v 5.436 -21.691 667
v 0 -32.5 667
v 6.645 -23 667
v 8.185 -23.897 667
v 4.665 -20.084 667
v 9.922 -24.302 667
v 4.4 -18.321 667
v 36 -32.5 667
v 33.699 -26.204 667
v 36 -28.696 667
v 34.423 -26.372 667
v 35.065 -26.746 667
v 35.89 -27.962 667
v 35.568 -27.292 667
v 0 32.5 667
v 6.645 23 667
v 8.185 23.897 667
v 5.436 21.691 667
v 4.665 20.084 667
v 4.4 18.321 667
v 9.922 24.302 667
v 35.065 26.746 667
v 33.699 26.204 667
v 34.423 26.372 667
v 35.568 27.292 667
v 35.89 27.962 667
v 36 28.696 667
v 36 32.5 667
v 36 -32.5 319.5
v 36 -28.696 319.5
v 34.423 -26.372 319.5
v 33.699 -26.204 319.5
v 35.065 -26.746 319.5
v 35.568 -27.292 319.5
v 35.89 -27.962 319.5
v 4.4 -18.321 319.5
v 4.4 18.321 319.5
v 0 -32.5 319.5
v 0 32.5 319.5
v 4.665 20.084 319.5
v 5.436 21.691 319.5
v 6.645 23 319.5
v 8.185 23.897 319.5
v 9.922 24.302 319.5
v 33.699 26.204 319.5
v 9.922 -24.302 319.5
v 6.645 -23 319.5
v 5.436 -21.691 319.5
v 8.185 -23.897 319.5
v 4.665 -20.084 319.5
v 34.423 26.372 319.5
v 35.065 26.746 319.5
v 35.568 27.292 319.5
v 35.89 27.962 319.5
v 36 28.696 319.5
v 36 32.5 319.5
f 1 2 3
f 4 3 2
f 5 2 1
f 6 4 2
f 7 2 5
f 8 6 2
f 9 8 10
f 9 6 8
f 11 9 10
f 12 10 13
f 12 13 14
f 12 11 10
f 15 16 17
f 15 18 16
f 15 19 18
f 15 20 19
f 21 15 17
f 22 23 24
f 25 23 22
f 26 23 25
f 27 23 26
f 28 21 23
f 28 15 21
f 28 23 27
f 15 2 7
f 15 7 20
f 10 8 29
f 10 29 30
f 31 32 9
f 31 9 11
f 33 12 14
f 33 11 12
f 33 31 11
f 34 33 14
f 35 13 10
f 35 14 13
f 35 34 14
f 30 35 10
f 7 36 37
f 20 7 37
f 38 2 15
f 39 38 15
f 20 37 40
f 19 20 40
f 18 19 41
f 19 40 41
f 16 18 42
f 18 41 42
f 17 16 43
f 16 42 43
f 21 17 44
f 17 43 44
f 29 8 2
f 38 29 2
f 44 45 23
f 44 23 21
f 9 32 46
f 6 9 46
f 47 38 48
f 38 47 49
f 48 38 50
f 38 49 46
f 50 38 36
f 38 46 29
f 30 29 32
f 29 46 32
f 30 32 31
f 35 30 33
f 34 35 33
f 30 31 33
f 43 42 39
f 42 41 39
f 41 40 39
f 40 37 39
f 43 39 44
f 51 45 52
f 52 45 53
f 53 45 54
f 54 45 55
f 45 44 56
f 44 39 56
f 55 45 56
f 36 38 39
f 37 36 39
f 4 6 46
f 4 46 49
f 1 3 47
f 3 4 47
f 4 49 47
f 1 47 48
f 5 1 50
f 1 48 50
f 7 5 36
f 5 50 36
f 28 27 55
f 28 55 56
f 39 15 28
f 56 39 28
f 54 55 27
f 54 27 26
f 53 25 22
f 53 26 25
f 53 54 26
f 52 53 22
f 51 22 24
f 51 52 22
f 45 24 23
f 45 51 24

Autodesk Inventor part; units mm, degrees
ref_plane "Начальная плоскость" through (0, 0, 319.5) normal (0, 0, 1) x (1, 0, 0)
ref_plane "Конечная плоскость" through (0, 0, 667) normal (0, 0, 1) x (1, 0, 0)
sketch "Эскиз" plane through (0, 0, 0) normal (0, 0, 1) x (1, 0, 0)
  line L0 (36, -32.5) -> (0, -32.5)
  line L1 (36, -32.5) -> (36, -28.696)
  line L2 (33.6994, -26.2039) -> (9.9215, -24.3017)
  line L3 (4.4, -18.3208) -> (4.4, 18.3208)
  line L4 (33.6994, 26.2039) -> (9.9215, 24.3017)
  line L5 (36, 28.696) -> (36, 32.5)
  line L6 (0, 32.5) -> (36, 32.5)
  line L7 (0, -32.5) -> (0, 32.5)
  arc A0 (4.4, -18.3208) -> (9.9215, -24.3017) centre (10.4, -18.3208) ccw
  arc A1 (9.9215, 24.3017) -> (4.4, 18.3208) centre (10.4, 18.3208) ccw
  arc A2 (36, -28.696) -> (33.6994, -26.2039) centre (33.5, -28.696) ccw
  arc A3 (33.6994, 26.2039) -> (36, 28.696) centre (33.5, 28.696) ccw
  line L8 (0, 45.5) -> (0, -45.5) construction
  line L9 (-7.2974, 0) -> (43.7847, 0) construction
  point P0 (36, -26.388)
  point P1 (4.4, -23.86)
  point P2 (4.4, 23.86)
  point P3 (36, 26.388)
  dimension "d3" = 36
  dimension "d5" = 4.4
  dimension "d7" = 65
  dimension "d9" = 8.64
  dimension "d11" = 8.64
  dimension "d13" = 6.112
  dimension "d15" = 6.112
  dimension "d22" = 6
  dimension "d23" = 2.5
  dimension "d24" = 32.5
  dimension "d25" = 0
extrude "Тело" add sketch "Эскиз" along normal up to surface (347.5 mm away) from surface at 319.5
sketch "Sketch3" plane through (0, 0, 0) normal (0, 0, 1) x (1, 0, 0)
  line L0 (0, 0) -> (10, 0)
ref_plane "Work Plane7" through (0, 0, 0) normal (0, -1, 0) x (1, 0, 0)
sketch "Sketch4" plane through (0, 0, 0) normal (0, -1, 0) x (1, 0, 0)
  line L0 (-2, 319.5) -> (12, 319.5)
  line L1 (-2, 667) -> (12, 667)
  dimension "d29" = 347.5
ref_plane "РабПлоскость8" through (0, 32.5, 319.5) normal (0, 0, -1) x (-1, 0, 0)
split "Разделение1" plane through (0, 32.5, 319.5) removes the side toward (0, 0, -1)
equation "\"d3\" = b"
equation "\"d5\" = t1"
equation "\"d7\" = ParH"
equation "\"d9\" = msp_x1 + t2"
equation "\"d11\" = msp_x1 + t2"
equation "\"d13\" = -msp_x2 + t2"
equation "\"d15\" = -msp_x2 + t2"
equation "\"d22\" = R"
equation "\"d23\" = R1"
equation "\"d24\" = 0.5 * d7"
equation "\"d16\" = G_L"
equation "\"R1\" = 2.5"
equation "\"R\" = 6"
equation "\"t1\" = 4.4"
equation "\"t2\" = 7.2"
equation "\"ParH\" = 65"
equation "\"b\" = 36"
equation "\"msp_x1\" = 0.04 * b"
equation "\"msp_x2\" = -0.08 * t1 + 0.04 * b"
equation "\"G_L\" = d29"
equation "\"ex\" = 0"
equation "\"G_OFFSET_START\" = -319.5"
equation "\"G_OFFSET_END\" = 0"
equation "\"d26\" = -G_OFFSET_START"
equation "\"d27\" = G_OFFSET_END + B_L"
equation "\"B_L\" = 667"
properties part number "Швеллер 6.5U-347,5 ГОСТ 8240-97" material "Сталь, мягкая"
